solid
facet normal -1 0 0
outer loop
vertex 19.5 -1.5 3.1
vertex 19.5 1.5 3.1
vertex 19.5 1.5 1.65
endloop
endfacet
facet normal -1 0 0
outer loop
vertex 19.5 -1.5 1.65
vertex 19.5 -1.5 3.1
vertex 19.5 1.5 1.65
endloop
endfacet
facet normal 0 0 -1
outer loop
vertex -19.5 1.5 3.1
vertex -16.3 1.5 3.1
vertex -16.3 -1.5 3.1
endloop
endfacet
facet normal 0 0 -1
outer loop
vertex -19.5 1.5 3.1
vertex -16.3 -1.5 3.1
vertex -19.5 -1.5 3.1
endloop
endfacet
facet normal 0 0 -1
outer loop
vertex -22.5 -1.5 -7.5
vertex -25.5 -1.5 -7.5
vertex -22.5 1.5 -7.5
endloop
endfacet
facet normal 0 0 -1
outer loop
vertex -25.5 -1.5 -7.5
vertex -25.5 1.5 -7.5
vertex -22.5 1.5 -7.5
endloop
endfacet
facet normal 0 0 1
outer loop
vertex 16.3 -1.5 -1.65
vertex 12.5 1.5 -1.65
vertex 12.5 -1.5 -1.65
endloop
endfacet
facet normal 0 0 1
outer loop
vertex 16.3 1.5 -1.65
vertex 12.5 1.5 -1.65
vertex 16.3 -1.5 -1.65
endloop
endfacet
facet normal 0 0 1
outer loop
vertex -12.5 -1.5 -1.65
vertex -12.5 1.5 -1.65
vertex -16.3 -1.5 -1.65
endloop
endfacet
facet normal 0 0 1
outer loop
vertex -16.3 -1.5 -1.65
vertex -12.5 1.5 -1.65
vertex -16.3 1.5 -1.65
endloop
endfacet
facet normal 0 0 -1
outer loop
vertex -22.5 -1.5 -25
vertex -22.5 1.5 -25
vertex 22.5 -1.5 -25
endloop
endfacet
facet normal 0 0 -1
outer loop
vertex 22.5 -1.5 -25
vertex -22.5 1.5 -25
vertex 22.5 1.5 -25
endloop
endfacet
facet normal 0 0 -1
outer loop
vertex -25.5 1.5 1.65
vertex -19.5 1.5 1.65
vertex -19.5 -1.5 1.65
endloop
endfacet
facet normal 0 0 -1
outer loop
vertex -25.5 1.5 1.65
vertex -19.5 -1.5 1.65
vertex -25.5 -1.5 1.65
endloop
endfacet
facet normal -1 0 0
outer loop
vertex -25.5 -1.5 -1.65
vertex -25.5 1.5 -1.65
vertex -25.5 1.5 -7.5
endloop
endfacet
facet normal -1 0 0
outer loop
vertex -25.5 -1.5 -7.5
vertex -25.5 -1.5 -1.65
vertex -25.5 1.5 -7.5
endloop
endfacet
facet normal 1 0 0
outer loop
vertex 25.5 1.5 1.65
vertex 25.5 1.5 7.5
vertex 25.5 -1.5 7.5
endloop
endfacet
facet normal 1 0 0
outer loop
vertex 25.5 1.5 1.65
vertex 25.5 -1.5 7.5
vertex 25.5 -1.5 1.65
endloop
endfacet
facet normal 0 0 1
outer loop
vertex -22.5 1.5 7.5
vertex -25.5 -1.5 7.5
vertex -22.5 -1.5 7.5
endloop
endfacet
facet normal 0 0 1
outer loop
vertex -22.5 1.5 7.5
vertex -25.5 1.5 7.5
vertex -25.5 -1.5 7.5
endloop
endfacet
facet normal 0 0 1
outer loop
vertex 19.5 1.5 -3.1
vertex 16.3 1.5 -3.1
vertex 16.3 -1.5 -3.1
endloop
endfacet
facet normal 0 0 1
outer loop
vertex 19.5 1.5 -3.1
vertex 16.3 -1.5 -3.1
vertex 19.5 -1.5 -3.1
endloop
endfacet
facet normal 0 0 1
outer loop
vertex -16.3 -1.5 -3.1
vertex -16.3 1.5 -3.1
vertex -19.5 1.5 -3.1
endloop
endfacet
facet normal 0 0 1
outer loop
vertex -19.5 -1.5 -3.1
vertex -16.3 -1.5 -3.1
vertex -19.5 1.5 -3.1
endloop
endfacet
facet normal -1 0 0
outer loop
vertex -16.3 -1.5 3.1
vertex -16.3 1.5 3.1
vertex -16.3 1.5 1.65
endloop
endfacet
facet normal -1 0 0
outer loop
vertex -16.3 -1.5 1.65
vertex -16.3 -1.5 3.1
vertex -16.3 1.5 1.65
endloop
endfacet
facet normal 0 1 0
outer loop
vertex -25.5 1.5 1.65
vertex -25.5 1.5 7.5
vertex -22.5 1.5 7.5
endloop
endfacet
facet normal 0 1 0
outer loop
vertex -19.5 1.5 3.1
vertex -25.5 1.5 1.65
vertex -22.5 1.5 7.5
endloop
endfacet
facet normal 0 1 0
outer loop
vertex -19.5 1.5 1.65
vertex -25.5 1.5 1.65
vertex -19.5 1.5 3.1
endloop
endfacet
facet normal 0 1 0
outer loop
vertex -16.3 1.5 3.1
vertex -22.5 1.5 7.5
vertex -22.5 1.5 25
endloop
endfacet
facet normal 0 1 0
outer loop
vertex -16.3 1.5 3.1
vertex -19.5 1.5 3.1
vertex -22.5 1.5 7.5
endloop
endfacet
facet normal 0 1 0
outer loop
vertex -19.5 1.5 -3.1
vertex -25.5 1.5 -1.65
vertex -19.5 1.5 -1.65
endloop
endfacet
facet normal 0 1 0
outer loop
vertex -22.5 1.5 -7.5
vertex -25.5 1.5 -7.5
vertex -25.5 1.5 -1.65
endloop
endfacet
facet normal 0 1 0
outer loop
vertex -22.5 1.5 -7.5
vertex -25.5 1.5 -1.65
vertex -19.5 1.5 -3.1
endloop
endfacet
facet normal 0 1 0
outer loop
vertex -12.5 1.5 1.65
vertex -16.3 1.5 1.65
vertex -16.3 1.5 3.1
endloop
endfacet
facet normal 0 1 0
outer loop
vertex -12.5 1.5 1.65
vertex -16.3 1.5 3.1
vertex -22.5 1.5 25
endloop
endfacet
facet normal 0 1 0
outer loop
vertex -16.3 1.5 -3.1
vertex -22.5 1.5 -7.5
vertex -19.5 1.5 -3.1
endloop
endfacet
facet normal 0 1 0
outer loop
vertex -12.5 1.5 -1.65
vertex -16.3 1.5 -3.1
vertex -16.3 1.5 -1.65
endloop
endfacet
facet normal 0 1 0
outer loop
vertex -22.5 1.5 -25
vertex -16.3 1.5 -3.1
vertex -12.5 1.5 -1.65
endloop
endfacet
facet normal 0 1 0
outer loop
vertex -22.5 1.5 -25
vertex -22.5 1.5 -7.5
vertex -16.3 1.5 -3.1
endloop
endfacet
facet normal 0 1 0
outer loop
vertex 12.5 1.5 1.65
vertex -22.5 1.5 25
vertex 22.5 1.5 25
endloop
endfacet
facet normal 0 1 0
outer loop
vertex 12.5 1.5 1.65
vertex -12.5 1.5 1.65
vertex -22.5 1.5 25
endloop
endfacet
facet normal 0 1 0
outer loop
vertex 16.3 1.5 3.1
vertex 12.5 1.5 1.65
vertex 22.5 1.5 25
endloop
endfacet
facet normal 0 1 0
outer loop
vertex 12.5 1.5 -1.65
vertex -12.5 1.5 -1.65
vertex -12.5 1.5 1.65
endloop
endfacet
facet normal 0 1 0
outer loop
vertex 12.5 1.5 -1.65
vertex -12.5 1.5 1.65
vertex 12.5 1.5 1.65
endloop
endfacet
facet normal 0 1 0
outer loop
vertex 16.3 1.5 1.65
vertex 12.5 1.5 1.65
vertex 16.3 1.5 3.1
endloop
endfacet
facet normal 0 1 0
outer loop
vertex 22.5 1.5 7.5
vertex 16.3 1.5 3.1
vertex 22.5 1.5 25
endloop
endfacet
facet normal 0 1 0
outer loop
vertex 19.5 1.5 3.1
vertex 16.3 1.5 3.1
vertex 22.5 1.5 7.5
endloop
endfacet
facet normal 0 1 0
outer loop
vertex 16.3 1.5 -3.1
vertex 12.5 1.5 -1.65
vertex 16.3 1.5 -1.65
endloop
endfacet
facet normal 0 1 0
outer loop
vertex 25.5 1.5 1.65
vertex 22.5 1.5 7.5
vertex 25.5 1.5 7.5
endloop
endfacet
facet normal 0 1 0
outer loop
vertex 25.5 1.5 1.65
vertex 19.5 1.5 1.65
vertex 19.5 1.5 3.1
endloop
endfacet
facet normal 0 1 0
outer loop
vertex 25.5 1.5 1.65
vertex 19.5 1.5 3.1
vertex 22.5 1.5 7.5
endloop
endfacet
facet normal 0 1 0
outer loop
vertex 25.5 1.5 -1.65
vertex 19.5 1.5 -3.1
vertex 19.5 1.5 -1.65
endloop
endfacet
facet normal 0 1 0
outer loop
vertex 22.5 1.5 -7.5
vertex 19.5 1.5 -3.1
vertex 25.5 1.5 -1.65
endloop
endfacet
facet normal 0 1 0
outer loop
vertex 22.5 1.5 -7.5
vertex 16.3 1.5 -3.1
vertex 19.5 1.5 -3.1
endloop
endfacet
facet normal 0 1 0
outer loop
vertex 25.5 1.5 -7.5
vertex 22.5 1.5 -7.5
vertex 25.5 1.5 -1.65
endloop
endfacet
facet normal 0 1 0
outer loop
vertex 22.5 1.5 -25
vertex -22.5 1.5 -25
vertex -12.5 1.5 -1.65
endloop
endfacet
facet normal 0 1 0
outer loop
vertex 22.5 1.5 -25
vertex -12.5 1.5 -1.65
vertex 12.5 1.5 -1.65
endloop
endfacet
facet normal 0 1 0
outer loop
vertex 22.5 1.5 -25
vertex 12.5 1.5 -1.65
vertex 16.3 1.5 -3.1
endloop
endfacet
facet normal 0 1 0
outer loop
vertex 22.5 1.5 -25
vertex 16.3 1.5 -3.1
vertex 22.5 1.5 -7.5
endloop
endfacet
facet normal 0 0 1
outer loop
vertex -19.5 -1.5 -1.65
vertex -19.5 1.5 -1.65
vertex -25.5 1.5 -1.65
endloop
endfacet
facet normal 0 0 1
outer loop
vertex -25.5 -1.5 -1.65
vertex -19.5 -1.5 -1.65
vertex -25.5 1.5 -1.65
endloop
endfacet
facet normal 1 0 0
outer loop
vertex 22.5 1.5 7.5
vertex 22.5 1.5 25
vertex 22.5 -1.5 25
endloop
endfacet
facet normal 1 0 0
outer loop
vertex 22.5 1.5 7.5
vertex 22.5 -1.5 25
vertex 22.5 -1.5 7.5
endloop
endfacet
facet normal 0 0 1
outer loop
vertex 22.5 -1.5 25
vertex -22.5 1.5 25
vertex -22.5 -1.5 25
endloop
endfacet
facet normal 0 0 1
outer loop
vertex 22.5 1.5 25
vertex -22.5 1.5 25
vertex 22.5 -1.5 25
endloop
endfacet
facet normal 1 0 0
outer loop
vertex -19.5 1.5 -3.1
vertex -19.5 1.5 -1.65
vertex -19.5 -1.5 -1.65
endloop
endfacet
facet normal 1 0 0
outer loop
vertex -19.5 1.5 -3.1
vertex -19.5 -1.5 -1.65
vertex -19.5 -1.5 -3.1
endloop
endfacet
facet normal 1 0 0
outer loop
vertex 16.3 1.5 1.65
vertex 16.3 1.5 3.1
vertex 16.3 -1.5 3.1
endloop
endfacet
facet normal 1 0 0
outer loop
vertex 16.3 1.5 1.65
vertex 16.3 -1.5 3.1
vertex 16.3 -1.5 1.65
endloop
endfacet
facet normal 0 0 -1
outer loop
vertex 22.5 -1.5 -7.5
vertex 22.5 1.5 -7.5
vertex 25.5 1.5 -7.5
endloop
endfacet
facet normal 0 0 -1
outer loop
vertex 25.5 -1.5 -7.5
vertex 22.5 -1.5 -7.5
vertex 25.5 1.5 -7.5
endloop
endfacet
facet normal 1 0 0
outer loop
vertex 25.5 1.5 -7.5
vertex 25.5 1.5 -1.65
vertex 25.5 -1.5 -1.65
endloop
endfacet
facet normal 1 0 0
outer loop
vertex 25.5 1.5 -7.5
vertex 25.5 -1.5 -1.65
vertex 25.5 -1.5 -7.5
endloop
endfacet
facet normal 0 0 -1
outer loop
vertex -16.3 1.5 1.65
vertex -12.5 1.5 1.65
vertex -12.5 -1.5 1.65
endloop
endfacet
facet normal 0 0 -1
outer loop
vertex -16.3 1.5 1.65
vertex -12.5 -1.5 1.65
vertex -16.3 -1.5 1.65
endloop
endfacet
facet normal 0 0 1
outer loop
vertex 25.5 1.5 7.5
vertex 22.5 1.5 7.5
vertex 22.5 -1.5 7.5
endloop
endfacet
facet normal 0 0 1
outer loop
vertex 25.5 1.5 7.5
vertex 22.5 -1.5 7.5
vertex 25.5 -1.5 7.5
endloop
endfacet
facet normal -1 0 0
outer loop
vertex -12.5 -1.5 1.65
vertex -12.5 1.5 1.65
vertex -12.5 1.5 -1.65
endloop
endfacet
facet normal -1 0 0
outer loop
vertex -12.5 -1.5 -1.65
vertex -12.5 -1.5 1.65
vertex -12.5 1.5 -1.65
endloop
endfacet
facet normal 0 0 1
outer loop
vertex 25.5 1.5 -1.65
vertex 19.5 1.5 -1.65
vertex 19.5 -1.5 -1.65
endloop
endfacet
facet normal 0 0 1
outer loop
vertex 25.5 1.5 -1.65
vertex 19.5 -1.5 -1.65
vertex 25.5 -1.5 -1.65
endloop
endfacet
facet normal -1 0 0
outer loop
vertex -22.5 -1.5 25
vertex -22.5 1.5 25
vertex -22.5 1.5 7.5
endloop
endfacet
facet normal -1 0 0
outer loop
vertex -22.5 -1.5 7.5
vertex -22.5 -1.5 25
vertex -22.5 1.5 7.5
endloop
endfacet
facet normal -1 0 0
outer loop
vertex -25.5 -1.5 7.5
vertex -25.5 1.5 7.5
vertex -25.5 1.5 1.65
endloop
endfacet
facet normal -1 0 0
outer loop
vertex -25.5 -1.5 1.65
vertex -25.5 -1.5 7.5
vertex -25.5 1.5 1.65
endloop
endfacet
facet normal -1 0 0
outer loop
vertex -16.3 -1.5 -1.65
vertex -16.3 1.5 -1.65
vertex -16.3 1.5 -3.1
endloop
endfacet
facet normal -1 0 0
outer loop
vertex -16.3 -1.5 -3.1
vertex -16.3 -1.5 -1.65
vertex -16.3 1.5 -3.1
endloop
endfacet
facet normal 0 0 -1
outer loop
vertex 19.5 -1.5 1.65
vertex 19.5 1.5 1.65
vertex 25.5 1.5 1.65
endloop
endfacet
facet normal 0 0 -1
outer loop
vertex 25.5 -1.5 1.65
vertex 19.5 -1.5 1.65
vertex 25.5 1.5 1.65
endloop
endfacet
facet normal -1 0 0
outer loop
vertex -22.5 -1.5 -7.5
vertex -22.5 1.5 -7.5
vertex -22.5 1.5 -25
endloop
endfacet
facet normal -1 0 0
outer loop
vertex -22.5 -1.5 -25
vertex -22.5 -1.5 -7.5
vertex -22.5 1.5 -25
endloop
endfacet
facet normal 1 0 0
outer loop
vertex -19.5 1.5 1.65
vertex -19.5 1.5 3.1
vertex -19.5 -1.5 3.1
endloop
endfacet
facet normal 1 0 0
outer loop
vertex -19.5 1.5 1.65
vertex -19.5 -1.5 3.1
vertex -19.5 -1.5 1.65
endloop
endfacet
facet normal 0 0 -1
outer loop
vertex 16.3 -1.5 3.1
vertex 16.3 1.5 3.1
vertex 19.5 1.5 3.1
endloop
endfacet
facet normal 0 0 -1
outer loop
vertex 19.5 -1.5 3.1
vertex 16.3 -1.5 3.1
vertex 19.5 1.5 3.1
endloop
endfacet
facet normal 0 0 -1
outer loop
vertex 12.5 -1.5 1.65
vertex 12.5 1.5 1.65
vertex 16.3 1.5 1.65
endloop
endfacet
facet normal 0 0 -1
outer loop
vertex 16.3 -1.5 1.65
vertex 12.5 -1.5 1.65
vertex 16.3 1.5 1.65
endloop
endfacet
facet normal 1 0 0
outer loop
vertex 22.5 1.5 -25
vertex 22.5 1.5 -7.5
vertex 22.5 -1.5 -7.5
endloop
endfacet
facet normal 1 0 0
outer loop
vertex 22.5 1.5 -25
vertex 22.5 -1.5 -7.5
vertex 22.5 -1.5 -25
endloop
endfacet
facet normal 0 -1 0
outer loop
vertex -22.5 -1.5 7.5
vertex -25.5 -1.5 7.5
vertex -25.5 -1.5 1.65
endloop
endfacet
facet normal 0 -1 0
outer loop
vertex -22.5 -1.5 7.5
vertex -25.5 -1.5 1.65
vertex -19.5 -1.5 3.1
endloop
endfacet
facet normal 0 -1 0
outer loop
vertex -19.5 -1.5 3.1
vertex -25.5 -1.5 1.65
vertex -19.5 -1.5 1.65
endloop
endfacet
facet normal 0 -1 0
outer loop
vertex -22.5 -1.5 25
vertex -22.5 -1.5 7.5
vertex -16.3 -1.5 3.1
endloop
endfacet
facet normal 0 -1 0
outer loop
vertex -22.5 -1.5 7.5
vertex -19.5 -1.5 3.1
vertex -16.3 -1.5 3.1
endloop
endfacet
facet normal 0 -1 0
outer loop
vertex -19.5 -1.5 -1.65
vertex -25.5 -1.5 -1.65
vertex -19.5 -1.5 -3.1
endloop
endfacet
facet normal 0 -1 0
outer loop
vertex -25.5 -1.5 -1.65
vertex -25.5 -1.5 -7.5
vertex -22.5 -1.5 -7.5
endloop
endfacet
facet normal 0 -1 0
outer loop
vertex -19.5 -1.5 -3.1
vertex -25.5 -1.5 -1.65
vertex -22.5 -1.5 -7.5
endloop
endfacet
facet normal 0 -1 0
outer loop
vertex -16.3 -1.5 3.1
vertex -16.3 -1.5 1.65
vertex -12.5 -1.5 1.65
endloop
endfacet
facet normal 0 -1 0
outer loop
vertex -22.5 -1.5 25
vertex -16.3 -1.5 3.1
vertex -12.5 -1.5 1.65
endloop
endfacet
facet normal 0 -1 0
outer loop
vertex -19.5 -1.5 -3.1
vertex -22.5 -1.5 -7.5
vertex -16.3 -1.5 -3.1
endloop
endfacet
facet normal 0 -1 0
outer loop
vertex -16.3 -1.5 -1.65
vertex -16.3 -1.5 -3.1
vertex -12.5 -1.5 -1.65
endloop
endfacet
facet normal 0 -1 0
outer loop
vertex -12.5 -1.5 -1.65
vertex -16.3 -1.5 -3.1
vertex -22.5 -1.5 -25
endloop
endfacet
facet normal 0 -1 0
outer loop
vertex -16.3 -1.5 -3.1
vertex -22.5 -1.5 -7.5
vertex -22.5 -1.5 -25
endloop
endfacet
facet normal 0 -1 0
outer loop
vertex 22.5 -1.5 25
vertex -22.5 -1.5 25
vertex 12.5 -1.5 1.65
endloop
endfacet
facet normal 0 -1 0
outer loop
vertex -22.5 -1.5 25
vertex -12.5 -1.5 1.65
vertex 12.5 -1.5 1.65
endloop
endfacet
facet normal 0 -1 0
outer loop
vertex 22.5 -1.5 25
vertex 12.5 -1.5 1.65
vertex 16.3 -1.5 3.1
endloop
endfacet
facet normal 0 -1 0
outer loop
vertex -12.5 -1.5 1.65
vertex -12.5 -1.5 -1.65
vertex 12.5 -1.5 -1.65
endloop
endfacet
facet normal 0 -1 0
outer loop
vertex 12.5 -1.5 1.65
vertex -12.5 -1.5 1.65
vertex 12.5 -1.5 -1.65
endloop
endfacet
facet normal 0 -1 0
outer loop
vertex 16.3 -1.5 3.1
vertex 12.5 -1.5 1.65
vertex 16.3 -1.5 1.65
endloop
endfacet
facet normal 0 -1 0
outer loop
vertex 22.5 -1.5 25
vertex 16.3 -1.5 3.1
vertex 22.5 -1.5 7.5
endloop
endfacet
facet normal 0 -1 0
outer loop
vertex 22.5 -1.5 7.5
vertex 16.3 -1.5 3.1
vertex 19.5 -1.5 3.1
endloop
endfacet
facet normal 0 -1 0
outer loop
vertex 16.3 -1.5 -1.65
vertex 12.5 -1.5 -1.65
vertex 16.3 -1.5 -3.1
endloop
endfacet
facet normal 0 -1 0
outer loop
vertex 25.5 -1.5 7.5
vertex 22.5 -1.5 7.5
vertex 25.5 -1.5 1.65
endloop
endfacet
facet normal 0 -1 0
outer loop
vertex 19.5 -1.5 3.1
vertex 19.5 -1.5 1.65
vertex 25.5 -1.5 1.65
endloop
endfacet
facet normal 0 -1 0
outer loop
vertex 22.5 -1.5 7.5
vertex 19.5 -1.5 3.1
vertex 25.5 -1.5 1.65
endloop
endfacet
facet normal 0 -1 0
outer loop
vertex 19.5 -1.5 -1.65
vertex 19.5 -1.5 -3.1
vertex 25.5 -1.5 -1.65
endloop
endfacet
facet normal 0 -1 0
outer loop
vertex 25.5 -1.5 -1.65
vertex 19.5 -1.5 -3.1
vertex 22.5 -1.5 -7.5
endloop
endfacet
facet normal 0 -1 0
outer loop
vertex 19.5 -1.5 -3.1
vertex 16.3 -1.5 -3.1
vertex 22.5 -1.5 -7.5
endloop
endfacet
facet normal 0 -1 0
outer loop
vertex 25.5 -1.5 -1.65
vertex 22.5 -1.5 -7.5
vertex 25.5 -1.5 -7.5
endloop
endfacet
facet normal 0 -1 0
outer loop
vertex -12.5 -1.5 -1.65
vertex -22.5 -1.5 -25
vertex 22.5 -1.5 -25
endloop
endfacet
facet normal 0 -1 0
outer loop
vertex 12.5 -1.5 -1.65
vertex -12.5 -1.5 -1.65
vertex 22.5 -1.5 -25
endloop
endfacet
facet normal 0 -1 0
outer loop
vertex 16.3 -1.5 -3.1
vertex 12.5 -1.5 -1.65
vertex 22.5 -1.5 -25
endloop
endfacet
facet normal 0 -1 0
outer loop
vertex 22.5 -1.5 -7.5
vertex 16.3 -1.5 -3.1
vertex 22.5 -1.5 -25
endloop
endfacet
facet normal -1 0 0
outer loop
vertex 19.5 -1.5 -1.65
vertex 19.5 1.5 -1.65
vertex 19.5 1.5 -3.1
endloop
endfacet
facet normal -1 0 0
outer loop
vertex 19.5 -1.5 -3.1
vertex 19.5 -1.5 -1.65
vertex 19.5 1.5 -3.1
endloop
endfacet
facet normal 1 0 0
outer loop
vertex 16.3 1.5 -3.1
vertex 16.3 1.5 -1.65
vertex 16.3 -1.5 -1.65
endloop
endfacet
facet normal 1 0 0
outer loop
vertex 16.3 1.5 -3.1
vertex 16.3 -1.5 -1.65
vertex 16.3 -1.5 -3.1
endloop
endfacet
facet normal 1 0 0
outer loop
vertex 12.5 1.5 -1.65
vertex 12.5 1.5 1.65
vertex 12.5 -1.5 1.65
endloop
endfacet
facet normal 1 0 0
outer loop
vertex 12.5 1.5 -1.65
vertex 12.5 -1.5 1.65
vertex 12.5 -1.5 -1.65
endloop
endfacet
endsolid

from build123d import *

# Parameters (mm, degrees)
SKETCH_1_W          = 45
SKETCH_1_H          = 50
SKETCH_1_W_2        = 3
SKETCH_1_H_2        = 15
EXTRUDE_1_DEPTH     = 1.5
SKETCH_2_W          = 3.8
SKETCH_2_H          = 3.3
SKETCH_2_W_2        = 3.2
SKETCH_2_H_2        = 1.45
SKETCH_2_W_3        = 6
CUT_EXTRUDE_1_DEPTH = 36.836433974


with BuildPart() as part:
    # 草图1 → 凸台-拉伸1 (new, symmetric)
    with BuildSketch(Plane(origin=(0, 0, 0), x_dir=(1, 0, 0), z_dir=(0, 1, 0))):
        Rectangle(SKETCH_1_W, SKETCH_1_H)
        with Locations((-24, 0)):
            Rectangle(SKETCH_1_W_2, SKETCH_1_H_2)
        with Locations((24, 0)):
            Rectangle(SKETCH_1_W_2, SKETCH_1_H_2)
    extrude(amount=EXTRUDE_1_DEPTH, both=True)

    # 草图2 → 切除-拉伸1 (cut, symmetric)
    with BuildSketch(Plane(origin=(0, 1.5, 0), x_dir=(1, 0, 0), z_dir=(0, 1, 0))):
        with Locations((14.4, 0)):
            Rectangle(SKETCH_2_W, SKETCH_2_H)
        with Locations((17.9, 2.375)):
            Rectangle(SKETCH_2_W_2, SKETCH_2_H_2)
        with Locations((17.9, 0)):
            Rectangle(SKETCH_2_W_2, SKETCH_2_H)
        with Locations((17.9, -2.375)):
            Rectangle(SKETCH_2_W_2, SKETCH_2_H_2)
        with Locations((22.5, 0)):
            Rectangle(SKETCH_2_W_3, SKETCH_2_H)
    cut_extrude_1 = extrude(amount=CUT_EXTRUDE_1_DEPTH, both=True, mode=Mode.SUBTRACT)

    # 镜向1: 切除-拉伸1 across plane
    add(cut_extrude_1.mirror(Plane(origin=(0, 0, 0), x_dir=(0, 0, 1), z_dir=(1, 0, 0))), mode=Mode.SUBTRACT)


solid = part.part
